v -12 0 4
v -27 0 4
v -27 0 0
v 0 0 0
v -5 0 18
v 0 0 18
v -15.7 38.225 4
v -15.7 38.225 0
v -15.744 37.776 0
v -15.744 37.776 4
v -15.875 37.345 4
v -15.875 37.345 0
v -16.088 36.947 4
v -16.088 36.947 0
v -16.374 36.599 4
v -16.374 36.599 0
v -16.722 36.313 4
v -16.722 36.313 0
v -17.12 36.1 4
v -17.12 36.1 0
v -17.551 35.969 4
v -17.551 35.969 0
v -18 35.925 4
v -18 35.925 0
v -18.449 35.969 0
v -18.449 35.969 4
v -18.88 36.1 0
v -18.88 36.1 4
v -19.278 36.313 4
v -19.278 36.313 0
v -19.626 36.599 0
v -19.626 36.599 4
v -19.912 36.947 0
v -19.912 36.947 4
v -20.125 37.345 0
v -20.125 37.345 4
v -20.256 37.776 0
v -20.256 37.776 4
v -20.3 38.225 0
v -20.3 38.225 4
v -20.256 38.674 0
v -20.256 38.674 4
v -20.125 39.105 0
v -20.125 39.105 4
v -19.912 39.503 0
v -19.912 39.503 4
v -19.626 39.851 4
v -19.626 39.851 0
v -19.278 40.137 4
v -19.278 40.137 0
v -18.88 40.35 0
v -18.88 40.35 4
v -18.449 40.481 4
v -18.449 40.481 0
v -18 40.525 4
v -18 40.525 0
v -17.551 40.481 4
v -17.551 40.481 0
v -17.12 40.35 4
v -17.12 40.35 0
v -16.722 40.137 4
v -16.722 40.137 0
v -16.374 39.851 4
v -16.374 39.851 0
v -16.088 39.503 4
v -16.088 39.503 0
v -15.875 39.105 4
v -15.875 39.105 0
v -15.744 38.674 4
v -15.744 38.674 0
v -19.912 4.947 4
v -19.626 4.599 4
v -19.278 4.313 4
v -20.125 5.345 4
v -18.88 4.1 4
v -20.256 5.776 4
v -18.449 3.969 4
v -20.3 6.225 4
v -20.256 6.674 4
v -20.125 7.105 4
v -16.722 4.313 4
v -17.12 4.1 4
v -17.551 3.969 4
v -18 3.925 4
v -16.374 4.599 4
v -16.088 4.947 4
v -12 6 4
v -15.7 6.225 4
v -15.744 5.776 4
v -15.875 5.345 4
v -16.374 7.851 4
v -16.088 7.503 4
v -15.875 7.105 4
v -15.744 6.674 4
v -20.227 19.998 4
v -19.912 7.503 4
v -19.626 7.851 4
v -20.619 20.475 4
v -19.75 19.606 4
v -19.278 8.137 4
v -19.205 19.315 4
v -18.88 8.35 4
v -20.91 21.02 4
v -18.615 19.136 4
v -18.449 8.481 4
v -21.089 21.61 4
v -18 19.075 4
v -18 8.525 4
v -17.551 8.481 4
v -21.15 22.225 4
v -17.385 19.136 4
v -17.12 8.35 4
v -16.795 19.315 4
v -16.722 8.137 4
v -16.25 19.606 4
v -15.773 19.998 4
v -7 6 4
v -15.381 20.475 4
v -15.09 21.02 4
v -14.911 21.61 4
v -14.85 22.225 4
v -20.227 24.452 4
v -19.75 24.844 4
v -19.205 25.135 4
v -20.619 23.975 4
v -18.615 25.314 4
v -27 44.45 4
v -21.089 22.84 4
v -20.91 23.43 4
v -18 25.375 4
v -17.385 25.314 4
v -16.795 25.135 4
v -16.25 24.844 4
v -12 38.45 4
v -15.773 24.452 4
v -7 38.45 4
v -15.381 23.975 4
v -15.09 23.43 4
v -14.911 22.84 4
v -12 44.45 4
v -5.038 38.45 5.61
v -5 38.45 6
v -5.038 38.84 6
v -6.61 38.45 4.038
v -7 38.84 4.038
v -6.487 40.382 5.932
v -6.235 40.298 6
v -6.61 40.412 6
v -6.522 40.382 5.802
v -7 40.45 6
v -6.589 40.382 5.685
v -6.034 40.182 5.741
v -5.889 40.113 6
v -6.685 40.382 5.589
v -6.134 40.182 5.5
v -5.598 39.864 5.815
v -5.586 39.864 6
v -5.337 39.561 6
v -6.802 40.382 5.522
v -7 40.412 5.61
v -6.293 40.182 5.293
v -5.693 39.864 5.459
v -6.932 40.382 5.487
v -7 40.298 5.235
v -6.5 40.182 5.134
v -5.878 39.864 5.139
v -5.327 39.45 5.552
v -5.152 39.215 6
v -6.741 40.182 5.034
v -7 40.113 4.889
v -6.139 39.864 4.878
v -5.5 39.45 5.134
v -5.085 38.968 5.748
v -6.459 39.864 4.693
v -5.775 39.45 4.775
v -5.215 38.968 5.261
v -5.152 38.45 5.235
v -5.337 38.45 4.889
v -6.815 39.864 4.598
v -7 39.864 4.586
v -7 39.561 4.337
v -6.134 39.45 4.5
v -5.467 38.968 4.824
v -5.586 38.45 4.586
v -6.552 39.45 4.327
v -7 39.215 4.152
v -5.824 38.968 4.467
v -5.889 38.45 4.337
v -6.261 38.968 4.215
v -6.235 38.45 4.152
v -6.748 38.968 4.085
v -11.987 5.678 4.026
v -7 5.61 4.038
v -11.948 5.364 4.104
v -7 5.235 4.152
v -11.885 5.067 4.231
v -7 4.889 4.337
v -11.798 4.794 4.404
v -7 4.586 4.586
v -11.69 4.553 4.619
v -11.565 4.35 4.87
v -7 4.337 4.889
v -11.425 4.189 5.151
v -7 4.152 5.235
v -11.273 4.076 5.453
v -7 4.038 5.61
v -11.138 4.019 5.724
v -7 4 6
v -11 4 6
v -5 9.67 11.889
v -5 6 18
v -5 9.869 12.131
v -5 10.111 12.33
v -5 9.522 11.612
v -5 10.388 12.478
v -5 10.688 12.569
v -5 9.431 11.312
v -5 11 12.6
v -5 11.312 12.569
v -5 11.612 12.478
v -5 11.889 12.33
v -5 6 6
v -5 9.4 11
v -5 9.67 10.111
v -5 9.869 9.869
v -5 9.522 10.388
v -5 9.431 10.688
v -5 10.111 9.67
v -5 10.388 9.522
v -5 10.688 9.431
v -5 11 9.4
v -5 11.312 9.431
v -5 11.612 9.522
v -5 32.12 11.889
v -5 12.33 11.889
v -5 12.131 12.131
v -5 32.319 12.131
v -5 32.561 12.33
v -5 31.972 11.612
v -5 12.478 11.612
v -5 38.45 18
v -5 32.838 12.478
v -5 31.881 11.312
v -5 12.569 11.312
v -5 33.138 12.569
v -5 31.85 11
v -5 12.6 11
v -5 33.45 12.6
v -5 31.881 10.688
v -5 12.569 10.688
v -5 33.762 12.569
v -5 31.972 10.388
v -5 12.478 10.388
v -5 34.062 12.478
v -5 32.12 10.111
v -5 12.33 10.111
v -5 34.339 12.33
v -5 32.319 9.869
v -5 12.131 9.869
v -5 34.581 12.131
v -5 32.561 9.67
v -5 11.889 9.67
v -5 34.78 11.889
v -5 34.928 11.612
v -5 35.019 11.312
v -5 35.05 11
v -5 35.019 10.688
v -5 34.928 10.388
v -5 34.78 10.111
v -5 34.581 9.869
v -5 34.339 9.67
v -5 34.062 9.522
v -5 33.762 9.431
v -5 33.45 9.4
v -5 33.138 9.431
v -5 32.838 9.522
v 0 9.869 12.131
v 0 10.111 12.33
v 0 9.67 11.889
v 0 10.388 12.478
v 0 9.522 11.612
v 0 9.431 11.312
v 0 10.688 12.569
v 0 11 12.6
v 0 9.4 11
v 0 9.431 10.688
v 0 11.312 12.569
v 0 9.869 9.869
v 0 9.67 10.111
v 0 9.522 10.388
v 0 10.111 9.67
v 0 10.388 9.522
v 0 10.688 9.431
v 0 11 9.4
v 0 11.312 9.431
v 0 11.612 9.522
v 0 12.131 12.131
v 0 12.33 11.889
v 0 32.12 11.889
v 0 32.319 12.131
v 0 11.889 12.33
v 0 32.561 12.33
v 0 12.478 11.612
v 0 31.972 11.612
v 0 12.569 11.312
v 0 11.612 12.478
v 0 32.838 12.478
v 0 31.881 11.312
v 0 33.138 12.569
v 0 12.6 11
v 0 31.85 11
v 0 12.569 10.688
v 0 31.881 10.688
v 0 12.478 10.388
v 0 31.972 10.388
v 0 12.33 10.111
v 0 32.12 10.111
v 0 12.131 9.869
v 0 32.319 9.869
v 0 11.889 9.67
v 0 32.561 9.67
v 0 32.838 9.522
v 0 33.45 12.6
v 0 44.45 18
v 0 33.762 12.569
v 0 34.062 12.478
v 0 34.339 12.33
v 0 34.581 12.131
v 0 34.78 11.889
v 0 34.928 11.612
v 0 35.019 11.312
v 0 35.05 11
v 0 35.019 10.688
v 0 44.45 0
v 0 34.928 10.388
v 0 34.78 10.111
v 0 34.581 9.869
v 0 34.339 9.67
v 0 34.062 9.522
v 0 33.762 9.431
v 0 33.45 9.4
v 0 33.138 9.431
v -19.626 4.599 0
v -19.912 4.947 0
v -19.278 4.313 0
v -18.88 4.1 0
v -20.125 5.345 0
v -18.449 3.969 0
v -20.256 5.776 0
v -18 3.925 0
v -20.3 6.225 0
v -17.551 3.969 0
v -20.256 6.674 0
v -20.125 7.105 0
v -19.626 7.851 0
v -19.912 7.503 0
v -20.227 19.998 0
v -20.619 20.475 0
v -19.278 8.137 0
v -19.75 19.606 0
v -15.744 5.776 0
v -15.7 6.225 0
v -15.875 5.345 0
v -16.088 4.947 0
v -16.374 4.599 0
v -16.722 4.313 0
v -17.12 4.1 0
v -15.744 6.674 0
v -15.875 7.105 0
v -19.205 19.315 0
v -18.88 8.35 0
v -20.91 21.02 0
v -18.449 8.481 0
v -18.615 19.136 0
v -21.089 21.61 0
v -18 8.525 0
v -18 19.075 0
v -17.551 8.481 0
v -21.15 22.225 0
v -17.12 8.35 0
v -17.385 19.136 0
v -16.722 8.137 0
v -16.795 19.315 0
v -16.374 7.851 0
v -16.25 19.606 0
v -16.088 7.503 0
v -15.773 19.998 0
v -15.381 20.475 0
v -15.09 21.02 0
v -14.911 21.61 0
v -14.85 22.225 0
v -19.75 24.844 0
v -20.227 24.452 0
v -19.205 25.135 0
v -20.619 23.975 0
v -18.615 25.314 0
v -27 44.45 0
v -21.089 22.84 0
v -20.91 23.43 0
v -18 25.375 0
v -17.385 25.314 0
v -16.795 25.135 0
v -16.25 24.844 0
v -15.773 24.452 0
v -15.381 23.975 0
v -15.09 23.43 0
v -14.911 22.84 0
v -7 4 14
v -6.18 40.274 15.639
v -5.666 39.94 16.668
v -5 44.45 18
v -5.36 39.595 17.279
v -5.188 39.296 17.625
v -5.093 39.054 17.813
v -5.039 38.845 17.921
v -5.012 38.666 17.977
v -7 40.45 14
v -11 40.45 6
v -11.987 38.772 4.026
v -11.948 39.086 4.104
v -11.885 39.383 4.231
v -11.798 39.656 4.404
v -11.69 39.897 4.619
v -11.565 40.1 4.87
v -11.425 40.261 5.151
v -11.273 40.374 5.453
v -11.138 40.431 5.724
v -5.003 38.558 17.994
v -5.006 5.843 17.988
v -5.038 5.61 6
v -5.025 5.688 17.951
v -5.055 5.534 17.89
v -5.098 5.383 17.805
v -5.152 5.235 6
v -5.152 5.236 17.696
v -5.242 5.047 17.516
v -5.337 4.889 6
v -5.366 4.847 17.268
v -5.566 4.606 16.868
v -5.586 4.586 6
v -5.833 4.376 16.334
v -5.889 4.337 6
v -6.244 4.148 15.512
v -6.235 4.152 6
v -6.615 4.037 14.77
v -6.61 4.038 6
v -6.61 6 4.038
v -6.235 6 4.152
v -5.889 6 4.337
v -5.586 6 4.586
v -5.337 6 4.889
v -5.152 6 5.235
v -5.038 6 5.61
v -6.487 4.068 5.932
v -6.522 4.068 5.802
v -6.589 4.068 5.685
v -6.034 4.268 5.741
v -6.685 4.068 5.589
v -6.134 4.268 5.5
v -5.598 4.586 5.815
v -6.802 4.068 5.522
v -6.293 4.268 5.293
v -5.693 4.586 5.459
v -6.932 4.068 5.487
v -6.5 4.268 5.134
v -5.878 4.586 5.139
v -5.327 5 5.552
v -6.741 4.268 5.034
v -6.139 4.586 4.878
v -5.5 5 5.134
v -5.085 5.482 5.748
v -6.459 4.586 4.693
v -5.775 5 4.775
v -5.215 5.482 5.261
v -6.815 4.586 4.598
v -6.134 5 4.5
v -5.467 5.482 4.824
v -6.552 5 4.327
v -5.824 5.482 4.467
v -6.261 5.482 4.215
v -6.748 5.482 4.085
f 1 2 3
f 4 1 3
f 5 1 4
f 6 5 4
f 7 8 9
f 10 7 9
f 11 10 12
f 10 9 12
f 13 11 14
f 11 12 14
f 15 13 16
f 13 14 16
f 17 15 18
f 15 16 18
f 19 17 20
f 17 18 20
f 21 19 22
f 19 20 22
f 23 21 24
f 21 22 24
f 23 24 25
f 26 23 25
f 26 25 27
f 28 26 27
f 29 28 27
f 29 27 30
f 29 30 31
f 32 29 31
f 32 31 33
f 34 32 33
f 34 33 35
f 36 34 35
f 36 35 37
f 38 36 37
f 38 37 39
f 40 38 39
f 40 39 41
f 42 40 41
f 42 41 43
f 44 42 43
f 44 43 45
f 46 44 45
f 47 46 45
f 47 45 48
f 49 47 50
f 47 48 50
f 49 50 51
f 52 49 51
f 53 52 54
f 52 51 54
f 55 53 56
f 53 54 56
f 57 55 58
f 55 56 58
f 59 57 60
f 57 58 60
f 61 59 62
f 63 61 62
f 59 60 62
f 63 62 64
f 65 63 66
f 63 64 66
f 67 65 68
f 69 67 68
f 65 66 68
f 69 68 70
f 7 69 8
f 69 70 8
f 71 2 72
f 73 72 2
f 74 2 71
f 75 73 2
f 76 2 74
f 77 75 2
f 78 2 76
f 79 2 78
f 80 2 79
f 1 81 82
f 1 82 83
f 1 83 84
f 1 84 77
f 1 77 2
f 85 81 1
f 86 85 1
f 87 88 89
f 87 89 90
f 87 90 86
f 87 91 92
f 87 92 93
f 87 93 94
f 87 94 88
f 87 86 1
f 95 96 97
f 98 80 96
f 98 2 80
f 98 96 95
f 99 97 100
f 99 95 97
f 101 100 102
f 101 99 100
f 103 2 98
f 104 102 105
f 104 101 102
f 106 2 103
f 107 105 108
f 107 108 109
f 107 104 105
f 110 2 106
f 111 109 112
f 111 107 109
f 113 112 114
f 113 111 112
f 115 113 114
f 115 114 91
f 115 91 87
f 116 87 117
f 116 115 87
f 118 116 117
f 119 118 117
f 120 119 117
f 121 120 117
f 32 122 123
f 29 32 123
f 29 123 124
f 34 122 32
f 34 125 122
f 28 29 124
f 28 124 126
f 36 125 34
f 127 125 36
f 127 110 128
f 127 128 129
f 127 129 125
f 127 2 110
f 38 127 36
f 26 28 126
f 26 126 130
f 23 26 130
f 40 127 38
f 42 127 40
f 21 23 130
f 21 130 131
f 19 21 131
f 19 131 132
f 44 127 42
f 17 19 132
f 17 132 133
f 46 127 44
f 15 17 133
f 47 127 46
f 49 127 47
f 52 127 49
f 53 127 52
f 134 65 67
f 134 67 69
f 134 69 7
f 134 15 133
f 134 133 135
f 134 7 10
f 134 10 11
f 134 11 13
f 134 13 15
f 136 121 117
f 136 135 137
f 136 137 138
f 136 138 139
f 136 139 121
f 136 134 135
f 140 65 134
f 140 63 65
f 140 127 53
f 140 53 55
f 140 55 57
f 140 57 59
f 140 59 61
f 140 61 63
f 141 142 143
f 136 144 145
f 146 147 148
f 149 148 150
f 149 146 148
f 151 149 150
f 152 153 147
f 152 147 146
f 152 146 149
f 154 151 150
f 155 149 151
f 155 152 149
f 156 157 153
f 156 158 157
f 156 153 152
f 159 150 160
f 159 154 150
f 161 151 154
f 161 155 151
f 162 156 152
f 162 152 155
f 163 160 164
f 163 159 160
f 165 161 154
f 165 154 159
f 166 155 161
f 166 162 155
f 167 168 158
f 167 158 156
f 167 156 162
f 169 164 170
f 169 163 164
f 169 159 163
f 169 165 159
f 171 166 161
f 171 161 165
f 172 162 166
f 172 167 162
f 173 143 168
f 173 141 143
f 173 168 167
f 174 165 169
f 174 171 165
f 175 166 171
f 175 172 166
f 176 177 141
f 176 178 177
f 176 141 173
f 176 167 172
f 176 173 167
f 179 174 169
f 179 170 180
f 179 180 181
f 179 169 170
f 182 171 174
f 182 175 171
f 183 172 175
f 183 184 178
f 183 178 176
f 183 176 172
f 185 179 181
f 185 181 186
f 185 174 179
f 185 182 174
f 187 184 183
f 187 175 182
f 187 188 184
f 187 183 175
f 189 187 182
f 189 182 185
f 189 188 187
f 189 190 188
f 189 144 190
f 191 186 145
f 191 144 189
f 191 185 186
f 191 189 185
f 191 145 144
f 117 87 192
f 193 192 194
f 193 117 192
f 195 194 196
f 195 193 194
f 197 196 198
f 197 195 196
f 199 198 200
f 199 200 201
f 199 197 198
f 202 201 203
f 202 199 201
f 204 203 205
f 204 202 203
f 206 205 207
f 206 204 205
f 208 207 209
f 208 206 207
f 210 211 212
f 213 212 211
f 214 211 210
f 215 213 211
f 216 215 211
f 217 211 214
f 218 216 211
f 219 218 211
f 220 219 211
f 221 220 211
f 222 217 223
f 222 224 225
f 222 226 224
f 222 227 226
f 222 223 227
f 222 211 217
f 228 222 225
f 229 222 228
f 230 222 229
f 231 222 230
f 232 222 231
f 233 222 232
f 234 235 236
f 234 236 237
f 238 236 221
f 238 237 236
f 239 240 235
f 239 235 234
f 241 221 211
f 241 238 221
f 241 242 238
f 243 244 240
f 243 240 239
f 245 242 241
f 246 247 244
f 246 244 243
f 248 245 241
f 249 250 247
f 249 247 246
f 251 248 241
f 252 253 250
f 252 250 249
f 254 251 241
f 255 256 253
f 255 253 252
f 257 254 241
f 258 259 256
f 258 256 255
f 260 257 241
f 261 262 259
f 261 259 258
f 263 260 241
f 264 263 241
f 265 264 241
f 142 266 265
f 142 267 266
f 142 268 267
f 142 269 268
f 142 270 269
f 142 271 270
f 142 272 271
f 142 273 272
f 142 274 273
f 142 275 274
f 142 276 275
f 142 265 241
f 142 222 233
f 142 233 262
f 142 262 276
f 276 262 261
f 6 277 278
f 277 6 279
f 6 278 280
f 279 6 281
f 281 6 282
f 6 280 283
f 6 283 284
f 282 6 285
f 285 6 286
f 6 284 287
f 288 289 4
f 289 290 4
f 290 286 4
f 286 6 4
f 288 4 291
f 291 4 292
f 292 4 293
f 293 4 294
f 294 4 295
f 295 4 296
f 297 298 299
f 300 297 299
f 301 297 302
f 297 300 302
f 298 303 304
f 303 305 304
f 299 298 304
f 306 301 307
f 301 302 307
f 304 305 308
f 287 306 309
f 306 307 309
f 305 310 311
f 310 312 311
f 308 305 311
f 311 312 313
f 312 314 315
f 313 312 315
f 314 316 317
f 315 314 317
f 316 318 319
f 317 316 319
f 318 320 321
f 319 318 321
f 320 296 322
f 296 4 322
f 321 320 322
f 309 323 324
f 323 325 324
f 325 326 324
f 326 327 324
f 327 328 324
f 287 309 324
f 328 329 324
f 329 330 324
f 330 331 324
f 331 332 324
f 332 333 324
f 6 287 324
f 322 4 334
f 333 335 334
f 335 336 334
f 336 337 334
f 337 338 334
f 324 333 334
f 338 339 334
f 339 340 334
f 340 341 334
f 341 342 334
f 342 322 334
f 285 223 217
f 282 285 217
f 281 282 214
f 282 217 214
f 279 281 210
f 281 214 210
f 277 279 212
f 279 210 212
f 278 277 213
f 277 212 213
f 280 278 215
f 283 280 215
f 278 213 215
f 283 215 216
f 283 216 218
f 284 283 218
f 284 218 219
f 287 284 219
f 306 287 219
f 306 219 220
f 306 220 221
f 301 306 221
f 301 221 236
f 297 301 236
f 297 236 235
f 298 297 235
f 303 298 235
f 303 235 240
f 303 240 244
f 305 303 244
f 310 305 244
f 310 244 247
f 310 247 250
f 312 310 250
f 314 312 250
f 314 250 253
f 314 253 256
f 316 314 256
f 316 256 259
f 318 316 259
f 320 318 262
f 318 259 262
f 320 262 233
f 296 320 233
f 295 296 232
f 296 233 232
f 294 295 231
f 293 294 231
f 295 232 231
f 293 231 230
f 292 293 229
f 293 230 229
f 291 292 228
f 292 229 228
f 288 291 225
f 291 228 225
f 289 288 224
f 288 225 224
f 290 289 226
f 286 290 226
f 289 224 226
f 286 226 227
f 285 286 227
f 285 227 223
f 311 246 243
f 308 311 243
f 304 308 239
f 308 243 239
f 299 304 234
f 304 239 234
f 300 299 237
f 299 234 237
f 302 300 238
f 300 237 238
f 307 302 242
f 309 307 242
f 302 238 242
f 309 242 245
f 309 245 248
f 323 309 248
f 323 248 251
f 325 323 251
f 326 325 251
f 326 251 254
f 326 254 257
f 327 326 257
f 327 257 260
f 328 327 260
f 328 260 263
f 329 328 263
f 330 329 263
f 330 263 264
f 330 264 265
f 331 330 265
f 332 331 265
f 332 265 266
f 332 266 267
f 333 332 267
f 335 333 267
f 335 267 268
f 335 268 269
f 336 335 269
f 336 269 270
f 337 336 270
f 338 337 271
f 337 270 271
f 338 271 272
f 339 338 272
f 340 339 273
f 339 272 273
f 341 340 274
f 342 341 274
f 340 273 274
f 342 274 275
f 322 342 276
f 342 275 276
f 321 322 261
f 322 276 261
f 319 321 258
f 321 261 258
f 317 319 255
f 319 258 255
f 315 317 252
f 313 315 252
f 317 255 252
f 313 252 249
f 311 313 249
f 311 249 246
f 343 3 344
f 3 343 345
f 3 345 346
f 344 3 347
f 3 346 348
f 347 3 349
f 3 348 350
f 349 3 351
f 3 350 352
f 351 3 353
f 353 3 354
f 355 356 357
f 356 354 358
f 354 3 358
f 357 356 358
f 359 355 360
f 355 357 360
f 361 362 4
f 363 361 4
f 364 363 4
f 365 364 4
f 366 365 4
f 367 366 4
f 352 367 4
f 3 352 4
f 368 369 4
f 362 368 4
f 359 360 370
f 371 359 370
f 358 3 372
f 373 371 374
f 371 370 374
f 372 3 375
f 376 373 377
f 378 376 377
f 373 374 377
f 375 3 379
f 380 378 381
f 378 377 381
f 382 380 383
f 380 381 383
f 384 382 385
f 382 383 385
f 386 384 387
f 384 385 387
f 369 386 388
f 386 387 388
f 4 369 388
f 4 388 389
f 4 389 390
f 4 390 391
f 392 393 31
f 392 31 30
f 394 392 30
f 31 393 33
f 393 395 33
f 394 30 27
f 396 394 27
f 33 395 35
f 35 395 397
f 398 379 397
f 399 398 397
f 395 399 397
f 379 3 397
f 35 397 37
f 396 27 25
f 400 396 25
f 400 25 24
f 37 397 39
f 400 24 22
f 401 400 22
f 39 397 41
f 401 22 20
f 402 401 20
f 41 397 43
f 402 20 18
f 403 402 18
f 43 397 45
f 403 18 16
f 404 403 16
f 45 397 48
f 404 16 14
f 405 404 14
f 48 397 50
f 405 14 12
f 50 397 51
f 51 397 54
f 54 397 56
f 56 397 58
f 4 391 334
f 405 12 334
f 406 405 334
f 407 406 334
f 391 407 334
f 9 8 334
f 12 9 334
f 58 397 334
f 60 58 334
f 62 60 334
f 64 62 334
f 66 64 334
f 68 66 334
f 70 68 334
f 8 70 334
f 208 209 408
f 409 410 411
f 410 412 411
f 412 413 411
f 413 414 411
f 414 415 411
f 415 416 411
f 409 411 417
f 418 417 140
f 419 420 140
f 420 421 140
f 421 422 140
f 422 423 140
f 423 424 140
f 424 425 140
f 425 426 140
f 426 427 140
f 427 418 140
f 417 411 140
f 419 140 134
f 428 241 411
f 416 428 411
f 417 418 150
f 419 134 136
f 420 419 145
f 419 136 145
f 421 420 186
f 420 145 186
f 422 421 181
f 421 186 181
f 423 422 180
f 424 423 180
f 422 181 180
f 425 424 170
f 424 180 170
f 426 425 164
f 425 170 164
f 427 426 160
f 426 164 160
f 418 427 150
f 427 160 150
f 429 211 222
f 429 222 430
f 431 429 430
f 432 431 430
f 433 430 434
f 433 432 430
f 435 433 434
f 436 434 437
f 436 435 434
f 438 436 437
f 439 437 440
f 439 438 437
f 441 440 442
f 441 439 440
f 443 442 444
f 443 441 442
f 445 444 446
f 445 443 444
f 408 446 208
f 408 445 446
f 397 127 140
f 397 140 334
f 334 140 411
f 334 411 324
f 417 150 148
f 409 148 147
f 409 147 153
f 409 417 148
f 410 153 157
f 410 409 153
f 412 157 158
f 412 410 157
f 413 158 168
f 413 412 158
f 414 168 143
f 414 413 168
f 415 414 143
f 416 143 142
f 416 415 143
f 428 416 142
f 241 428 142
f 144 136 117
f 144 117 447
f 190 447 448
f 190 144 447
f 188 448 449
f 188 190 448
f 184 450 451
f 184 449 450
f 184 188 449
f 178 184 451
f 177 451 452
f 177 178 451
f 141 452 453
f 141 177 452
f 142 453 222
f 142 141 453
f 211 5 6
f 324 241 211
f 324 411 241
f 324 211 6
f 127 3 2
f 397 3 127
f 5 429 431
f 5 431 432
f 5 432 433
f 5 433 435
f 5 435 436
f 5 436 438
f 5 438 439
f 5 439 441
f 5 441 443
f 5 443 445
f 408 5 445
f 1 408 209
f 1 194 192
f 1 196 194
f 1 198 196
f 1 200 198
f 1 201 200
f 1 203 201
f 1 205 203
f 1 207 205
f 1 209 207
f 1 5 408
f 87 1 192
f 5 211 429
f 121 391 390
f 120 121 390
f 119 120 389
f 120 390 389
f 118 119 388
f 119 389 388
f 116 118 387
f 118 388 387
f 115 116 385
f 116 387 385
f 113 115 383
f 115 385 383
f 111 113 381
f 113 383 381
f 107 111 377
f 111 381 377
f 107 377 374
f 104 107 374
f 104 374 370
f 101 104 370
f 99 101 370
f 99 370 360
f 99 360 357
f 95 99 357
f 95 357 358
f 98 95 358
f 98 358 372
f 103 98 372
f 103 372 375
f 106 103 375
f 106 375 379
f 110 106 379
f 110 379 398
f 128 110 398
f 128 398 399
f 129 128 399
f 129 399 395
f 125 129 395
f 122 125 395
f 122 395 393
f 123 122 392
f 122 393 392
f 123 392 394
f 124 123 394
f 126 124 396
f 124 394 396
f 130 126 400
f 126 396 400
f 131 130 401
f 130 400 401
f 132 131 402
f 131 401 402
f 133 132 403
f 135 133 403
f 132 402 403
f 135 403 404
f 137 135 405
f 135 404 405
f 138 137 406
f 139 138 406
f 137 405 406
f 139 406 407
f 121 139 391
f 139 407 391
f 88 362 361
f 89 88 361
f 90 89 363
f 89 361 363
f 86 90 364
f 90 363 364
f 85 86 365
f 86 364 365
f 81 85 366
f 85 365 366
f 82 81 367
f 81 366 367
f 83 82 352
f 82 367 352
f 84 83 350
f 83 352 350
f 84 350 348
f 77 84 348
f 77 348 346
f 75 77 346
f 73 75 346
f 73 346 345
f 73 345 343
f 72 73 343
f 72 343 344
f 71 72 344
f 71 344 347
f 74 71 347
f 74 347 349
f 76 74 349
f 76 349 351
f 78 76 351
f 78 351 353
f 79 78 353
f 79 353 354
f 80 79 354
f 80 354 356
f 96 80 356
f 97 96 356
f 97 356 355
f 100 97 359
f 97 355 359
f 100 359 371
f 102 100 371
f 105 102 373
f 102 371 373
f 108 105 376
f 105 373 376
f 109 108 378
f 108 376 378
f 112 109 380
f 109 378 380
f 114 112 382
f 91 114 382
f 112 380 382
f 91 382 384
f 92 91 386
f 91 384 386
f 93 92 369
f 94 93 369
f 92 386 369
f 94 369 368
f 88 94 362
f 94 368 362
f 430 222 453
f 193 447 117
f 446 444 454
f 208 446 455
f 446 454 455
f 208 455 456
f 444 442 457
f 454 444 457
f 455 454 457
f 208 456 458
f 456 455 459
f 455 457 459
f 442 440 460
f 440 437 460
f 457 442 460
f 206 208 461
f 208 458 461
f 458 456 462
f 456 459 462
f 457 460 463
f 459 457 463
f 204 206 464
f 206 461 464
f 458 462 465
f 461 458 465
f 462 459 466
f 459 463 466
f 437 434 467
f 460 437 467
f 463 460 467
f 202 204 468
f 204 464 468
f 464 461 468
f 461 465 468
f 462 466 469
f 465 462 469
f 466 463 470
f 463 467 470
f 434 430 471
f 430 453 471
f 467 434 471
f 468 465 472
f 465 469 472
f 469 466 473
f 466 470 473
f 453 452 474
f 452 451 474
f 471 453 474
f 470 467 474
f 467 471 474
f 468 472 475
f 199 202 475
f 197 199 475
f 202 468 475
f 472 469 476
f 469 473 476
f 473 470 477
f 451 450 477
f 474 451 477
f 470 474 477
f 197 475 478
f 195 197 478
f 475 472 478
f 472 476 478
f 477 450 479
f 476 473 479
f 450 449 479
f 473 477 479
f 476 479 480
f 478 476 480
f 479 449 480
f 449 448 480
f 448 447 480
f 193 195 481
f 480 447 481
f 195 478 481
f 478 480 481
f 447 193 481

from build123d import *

# Parameters (mm, degrees)
TABFACEPLATESKETCH_W      = 27
TABFACEPLATESKETCH_H      = 44.45
TABFACEPLATEPAD_DEPTH     = 4
TABFLANGESKETCH_W         = 5
TABFLANGESKETCH_H         = 44.45
TABFLANGEPAD_DEPTH        = 14
BOTTOMGUSSETPAD_DEPTH     = 4
TOPGUSSETPAD_DEPTH        = 4
RAILHOLESSKETCH_R         = 2.3
RAILHOLESSKETCH_R_2       = 3.15
RAILHOLESPOCKET_DEPTH     = 18.001
TABJOINTHOLESSKETCH_R     = 1.6
TABJOINTHOLESPOCKET_DEPTH = 5.001
TABINSIDEFILLETS_R        = 2


with BuildPart() as part:
    # TabFacePlateSketch → TabFacePlatePad (new body)
    with BuildSketch(Plane.XY):
        with Locations((-13.5, 22.225)):
            Rectangle(TABFACEPLATESKETCH_W, TABFACEPLATESKETCH_H)
    extrude(amount=TABFACEPLATEPAD_DEPTH)

    # TabFlangeSketch (on Face6 of TabFacePlatePad) → TabFlangePad (join)
    with BuildSketch(Plane.XY.offset(4)):
        with Locations((-2.5, 22.225)):
            Rectangle(TABFLANGESKETCH_W, TABFLANGESKETCH_H)
    extrude(amount=TABFLANGEPAD_DEPTH)

    # BottomGussetSketch (on Face6 of TabFlangePad) → BottomGussetPad (join)
    with BuildSketch(Plane.XZ):
        Polygon((-12, 4), (-5, 4), (-5, 18), align=None)
    extrude(amount=-BOTTOMGUSSETPAD_DEPTH)

    # TopGussetSketch (on Face2 of BottomGussetPad) → TopGussetPad (join)
    with BuildSketch(Plane(origin=(0, 44.45, 0), x_dir=(-1, 0, 0), z_dir=(0, 1, 0))):
        Polygon((12, 4), (5, 4), (5, 18), align=None)
    extrude(amount=-TOPGUSSETPAD_DEPTH)

    # RailHolesSketch (on Face3 of TopGussetPad) → RailHolesPocket (cut, through all)
    with BuildSketch(Plane(origin=(0, 0, 0), x_dir=(1, 0, 0), z_dir=(0, 0, -1))):
        with Locations((-18, -6.225)):
            Circle(RAILHOLESSKETCH_R)
        with Locations((-18, -22.225)):
            Circle(RAILHOLESSKETCH_R_2)
        with Locations((-18, -38.225)):
            Circle(RAILHOLESSKETCH_R)
    extrude(amount=-RAILHOLESPOCKET_DEPTH, mode=Mode.SUBTRACT)

    # TabJointHolesSketch (on Face14 of RailHolesPocket) → TabJointHolesPocket (cut, through all)
    with BuildSketch(Plane(origin=(-5, 0, 0), x_dir=(0, -1, 0), z_dir=(-1, 0, 0))):
        with Locations((-11, 11)):
            Circle(TABJOINTHOLESSKETCH_R)
        with Locations((-33.45, 11)):
            Circle(TABJOINTHOLESSKETCH_R)
    extrude(amount=-TABJOINTHOLESPOCKET_DEPTH, mode=Mode.SUBTRACT)

    # TabInsideFillets
    tabinsidefillets_edges = [part.edges().sort_by_distance(p)[0] for p in [
        (-5, 22.225, 4),
        (-5, 40.45, 11),
        (-5, 4, 11),
        (-8.5, 40.45, 4),
        (-8.5, 4, 4),
    ]]
    fillet(tabinsidefillets_edges, radius=TABINSIDEFILLETS_R)


solid = part.part
